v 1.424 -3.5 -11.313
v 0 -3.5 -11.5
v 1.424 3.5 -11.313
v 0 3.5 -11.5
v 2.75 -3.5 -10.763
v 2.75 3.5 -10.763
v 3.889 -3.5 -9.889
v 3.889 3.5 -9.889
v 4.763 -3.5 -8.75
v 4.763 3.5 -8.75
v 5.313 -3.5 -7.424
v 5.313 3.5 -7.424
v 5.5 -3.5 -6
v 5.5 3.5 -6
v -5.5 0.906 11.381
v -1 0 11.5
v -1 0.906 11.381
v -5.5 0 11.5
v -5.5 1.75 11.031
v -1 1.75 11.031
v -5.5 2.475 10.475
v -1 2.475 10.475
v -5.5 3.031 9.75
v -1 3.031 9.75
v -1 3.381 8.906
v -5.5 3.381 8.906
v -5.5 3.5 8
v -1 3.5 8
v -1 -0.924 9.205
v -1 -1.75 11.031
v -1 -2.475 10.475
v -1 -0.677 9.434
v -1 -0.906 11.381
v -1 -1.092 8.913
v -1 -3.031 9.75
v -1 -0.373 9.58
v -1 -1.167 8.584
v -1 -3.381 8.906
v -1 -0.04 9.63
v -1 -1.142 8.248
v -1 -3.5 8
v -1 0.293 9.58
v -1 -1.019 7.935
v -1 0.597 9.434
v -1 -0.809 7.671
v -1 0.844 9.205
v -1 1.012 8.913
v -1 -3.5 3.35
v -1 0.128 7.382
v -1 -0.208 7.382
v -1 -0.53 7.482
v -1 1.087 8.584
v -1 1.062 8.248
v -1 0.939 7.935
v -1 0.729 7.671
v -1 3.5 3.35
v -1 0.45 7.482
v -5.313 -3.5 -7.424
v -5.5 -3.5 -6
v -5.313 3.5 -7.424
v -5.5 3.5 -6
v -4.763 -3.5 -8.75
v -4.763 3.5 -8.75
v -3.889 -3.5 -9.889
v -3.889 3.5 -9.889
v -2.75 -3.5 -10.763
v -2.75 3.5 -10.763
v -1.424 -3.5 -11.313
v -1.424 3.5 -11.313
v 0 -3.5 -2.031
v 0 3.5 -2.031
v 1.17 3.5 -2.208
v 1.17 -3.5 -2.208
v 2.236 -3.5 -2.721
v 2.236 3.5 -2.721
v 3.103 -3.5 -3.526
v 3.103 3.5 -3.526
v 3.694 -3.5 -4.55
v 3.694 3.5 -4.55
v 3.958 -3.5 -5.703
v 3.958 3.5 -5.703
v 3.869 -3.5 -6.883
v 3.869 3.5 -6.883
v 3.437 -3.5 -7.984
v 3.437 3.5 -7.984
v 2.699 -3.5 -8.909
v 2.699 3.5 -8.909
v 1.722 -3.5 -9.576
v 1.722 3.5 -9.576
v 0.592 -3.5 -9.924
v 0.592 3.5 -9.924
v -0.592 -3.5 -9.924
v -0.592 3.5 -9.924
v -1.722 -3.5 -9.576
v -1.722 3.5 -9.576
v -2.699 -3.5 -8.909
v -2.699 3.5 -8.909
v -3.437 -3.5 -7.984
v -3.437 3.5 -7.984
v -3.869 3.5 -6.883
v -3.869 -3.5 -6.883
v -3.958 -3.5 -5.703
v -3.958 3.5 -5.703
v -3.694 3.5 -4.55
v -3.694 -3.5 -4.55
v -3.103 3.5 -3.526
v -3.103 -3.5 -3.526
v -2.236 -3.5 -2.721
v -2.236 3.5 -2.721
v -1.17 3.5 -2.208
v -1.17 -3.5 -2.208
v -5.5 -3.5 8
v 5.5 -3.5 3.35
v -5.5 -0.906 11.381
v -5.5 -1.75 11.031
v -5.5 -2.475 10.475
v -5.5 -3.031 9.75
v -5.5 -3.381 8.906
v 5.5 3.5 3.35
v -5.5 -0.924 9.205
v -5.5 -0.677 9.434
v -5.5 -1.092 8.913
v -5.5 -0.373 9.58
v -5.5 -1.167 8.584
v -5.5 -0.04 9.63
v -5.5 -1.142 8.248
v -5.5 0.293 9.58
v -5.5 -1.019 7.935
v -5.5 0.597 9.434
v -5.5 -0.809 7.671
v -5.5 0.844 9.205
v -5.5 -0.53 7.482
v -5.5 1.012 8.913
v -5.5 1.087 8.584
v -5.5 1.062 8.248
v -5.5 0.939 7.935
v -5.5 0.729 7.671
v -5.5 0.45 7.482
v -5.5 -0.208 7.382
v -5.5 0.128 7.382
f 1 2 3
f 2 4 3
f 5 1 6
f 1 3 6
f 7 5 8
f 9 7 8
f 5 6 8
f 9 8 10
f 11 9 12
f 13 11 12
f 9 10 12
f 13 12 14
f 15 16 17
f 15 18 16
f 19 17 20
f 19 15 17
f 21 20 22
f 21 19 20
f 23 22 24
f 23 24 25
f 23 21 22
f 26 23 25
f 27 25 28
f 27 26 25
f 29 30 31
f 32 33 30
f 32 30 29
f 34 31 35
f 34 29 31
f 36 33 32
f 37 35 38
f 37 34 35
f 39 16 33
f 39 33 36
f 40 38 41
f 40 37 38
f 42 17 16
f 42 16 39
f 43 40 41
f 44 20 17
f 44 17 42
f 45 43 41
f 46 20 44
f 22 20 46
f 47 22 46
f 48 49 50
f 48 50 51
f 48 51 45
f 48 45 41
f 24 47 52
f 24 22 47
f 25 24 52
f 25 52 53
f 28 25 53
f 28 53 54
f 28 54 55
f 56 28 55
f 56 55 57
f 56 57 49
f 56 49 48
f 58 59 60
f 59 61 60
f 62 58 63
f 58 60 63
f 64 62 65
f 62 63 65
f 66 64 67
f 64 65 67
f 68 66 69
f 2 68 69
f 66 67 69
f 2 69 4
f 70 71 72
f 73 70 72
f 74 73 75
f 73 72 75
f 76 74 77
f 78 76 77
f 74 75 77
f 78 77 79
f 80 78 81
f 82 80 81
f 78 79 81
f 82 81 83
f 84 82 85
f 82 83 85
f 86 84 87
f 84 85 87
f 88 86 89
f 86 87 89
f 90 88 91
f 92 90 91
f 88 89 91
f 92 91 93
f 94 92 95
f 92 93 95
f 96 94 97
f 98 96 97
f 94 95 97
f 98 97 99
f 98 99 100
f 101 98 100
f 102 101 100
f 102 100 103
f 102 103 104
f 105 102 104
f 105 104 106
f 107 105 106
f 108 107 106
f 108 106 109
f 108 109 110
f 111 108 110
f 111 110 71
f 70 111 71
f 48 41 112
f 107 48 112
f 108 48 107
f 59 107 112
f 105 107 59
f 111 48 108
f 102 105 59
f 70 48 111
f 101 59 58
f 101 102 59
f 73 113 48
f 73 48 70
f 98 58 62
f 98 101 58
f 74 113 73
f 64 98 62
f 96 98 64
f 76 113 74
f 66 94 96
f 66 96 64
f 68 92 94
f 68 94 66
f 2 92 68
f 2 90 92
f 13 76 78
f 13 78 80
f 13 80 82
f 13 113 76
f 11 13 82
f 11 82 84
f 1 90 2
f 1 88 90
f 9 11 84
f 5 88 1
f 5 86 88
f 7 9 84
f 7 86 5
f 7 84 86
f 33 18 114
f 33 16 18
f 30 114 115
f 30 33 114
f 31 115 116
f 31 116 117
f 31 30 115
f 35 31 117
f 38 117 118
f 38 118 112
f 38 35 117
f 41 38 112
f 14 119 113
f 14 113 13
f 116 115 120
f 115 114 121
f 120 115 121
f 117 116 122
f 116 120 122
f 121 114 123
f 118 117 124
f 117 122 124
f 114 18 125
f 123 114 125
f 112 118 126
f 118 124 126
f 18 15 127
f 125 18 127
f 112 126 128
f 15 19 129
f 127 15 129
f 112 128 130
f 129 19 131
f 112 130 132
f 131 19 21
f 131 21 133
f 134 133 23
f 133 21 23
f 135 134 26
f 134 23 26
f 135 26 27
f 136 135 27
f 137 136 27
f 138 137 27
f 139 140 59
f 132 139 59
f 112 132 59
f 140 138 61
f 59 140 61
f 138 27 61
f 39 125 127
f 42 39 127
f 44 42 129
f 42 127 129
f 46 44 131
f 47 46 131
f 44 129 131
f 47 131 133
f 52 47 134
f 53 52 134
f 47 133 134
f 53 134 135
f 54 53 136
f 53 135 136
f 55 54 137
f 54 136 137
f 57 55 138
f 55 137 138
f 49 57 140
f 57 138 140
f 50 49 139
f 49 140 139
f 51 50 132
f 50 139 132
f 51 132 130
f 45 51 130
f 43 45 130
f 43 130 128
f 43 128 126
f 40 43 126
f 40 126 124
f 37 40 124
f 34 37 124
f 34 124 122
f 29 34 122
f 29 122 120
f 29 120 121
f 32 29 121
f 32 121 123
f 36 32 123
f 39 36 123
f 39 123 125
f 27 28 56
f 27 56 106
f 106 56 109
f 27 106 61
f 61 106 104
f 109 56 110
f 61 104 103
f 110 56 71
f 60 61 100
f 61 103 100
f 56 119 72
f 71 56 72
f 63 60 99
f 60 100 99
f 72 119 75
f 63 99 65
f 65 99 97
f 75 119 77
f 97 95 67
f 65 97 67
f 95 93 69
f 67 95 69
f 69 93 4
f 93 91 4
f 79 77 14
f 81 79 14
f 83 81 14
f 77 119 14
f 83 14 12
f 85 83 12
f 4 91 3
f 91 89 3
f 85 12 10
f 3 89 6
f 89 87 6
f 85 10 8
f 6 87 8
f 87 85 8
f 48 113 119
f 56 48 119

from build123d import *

# Parameters (mm, degrees)
SKETCH1_W             = 23
SKETCH1_H             = 7
BOSS_EXTRUDE1_DEPTH   = 5.5
SKETCH2_R             = 3.96875
CUT_EXTRUDE1_DEPTH    = 15.543039572
SKETCH3_W             = 8.15
SKETCH3_H             = 7
CUT_EXTRUDE2_DEPTH    = 6.5
F_4_40_TAPPED_HOLE1_D = 2.2606
FILLET1_R             = 3.5
FILLET2_R             = 5.5


with BuildPart() as part:
    # Sketch1 → Boss-Extrude1 (new, symmetric)
    with BuildSketch(Plane(origin=(0, 0, 0), x_dir=(0, 0, -1), z_dir=(1, 0, 0))):
        Rectangle(SKETCH1_W, SKETCH1_H)
    extrude(amount=BOSS_EXTRUDE1_DEPTH, both=True)

    # Sketch2 → Cut-Extrude1 (cut, through all)
    with BuildSketch(Plane(origin=(0, 3.5, 0), x_dir=(1, 0, 0), z_dir=(0, 1, 0))):
        with Locations(Location((0, 6, 0), (0, 0, 270))):
            Circle(SKETCH2_R)
    extrude(amount=-CUT_EXTRUDE1_DEPTH, mode=Mode.SUBTRACT)

    # Sketch3 → Cut-Extrude2 (cut)
    with BuildSketch(Plane(origin=(5.5, 0, 0), x_dir=(0, 0, -1), z_dir=(1, 0, 0))):
        with Locations((-7.425, 0)):
            Rectangle(SKETCH3_W, SKETCH3_H)
    extrude(amount=-CUT_EXTRUDE2_DEPTH, mode=Mode.SUBTRACT)

    # #4-40 Tapped Hole1 (through all)
    with Locations(Plane(origin=(-1, 0, 0), x_dir=(0, 0, -1), z_dir=(1, 0, 0))):
        with Locations((-8.5, -0.04)):
            Hole(F_4_40_TAPPED_HOLE1_D / 2)

    # Fillet1
    fillet1_edges = [part.edges().sort_by_distance(p)[0] for p in [
        (-3.25, -3.5, 11.5),
        (-3.25, 3.5, 11.5),
    ]]
    fillet(fillet1_edges, radius=FILLET1_R - 0.0001)  # a hair under: the kernel refuses the full size

    # Fillet2
    fillet2_edges = [part.edges().sort_by_distance(p)[0] for p in [
        (-5.5, 0, -11.5),
        (5.5, 0, -11.5),
    ]]
    fillet(fillet2_edges, radius=FILLET2_R - 0.0001)  # a hair under: the kernel refuses the full size


solid = part.part
